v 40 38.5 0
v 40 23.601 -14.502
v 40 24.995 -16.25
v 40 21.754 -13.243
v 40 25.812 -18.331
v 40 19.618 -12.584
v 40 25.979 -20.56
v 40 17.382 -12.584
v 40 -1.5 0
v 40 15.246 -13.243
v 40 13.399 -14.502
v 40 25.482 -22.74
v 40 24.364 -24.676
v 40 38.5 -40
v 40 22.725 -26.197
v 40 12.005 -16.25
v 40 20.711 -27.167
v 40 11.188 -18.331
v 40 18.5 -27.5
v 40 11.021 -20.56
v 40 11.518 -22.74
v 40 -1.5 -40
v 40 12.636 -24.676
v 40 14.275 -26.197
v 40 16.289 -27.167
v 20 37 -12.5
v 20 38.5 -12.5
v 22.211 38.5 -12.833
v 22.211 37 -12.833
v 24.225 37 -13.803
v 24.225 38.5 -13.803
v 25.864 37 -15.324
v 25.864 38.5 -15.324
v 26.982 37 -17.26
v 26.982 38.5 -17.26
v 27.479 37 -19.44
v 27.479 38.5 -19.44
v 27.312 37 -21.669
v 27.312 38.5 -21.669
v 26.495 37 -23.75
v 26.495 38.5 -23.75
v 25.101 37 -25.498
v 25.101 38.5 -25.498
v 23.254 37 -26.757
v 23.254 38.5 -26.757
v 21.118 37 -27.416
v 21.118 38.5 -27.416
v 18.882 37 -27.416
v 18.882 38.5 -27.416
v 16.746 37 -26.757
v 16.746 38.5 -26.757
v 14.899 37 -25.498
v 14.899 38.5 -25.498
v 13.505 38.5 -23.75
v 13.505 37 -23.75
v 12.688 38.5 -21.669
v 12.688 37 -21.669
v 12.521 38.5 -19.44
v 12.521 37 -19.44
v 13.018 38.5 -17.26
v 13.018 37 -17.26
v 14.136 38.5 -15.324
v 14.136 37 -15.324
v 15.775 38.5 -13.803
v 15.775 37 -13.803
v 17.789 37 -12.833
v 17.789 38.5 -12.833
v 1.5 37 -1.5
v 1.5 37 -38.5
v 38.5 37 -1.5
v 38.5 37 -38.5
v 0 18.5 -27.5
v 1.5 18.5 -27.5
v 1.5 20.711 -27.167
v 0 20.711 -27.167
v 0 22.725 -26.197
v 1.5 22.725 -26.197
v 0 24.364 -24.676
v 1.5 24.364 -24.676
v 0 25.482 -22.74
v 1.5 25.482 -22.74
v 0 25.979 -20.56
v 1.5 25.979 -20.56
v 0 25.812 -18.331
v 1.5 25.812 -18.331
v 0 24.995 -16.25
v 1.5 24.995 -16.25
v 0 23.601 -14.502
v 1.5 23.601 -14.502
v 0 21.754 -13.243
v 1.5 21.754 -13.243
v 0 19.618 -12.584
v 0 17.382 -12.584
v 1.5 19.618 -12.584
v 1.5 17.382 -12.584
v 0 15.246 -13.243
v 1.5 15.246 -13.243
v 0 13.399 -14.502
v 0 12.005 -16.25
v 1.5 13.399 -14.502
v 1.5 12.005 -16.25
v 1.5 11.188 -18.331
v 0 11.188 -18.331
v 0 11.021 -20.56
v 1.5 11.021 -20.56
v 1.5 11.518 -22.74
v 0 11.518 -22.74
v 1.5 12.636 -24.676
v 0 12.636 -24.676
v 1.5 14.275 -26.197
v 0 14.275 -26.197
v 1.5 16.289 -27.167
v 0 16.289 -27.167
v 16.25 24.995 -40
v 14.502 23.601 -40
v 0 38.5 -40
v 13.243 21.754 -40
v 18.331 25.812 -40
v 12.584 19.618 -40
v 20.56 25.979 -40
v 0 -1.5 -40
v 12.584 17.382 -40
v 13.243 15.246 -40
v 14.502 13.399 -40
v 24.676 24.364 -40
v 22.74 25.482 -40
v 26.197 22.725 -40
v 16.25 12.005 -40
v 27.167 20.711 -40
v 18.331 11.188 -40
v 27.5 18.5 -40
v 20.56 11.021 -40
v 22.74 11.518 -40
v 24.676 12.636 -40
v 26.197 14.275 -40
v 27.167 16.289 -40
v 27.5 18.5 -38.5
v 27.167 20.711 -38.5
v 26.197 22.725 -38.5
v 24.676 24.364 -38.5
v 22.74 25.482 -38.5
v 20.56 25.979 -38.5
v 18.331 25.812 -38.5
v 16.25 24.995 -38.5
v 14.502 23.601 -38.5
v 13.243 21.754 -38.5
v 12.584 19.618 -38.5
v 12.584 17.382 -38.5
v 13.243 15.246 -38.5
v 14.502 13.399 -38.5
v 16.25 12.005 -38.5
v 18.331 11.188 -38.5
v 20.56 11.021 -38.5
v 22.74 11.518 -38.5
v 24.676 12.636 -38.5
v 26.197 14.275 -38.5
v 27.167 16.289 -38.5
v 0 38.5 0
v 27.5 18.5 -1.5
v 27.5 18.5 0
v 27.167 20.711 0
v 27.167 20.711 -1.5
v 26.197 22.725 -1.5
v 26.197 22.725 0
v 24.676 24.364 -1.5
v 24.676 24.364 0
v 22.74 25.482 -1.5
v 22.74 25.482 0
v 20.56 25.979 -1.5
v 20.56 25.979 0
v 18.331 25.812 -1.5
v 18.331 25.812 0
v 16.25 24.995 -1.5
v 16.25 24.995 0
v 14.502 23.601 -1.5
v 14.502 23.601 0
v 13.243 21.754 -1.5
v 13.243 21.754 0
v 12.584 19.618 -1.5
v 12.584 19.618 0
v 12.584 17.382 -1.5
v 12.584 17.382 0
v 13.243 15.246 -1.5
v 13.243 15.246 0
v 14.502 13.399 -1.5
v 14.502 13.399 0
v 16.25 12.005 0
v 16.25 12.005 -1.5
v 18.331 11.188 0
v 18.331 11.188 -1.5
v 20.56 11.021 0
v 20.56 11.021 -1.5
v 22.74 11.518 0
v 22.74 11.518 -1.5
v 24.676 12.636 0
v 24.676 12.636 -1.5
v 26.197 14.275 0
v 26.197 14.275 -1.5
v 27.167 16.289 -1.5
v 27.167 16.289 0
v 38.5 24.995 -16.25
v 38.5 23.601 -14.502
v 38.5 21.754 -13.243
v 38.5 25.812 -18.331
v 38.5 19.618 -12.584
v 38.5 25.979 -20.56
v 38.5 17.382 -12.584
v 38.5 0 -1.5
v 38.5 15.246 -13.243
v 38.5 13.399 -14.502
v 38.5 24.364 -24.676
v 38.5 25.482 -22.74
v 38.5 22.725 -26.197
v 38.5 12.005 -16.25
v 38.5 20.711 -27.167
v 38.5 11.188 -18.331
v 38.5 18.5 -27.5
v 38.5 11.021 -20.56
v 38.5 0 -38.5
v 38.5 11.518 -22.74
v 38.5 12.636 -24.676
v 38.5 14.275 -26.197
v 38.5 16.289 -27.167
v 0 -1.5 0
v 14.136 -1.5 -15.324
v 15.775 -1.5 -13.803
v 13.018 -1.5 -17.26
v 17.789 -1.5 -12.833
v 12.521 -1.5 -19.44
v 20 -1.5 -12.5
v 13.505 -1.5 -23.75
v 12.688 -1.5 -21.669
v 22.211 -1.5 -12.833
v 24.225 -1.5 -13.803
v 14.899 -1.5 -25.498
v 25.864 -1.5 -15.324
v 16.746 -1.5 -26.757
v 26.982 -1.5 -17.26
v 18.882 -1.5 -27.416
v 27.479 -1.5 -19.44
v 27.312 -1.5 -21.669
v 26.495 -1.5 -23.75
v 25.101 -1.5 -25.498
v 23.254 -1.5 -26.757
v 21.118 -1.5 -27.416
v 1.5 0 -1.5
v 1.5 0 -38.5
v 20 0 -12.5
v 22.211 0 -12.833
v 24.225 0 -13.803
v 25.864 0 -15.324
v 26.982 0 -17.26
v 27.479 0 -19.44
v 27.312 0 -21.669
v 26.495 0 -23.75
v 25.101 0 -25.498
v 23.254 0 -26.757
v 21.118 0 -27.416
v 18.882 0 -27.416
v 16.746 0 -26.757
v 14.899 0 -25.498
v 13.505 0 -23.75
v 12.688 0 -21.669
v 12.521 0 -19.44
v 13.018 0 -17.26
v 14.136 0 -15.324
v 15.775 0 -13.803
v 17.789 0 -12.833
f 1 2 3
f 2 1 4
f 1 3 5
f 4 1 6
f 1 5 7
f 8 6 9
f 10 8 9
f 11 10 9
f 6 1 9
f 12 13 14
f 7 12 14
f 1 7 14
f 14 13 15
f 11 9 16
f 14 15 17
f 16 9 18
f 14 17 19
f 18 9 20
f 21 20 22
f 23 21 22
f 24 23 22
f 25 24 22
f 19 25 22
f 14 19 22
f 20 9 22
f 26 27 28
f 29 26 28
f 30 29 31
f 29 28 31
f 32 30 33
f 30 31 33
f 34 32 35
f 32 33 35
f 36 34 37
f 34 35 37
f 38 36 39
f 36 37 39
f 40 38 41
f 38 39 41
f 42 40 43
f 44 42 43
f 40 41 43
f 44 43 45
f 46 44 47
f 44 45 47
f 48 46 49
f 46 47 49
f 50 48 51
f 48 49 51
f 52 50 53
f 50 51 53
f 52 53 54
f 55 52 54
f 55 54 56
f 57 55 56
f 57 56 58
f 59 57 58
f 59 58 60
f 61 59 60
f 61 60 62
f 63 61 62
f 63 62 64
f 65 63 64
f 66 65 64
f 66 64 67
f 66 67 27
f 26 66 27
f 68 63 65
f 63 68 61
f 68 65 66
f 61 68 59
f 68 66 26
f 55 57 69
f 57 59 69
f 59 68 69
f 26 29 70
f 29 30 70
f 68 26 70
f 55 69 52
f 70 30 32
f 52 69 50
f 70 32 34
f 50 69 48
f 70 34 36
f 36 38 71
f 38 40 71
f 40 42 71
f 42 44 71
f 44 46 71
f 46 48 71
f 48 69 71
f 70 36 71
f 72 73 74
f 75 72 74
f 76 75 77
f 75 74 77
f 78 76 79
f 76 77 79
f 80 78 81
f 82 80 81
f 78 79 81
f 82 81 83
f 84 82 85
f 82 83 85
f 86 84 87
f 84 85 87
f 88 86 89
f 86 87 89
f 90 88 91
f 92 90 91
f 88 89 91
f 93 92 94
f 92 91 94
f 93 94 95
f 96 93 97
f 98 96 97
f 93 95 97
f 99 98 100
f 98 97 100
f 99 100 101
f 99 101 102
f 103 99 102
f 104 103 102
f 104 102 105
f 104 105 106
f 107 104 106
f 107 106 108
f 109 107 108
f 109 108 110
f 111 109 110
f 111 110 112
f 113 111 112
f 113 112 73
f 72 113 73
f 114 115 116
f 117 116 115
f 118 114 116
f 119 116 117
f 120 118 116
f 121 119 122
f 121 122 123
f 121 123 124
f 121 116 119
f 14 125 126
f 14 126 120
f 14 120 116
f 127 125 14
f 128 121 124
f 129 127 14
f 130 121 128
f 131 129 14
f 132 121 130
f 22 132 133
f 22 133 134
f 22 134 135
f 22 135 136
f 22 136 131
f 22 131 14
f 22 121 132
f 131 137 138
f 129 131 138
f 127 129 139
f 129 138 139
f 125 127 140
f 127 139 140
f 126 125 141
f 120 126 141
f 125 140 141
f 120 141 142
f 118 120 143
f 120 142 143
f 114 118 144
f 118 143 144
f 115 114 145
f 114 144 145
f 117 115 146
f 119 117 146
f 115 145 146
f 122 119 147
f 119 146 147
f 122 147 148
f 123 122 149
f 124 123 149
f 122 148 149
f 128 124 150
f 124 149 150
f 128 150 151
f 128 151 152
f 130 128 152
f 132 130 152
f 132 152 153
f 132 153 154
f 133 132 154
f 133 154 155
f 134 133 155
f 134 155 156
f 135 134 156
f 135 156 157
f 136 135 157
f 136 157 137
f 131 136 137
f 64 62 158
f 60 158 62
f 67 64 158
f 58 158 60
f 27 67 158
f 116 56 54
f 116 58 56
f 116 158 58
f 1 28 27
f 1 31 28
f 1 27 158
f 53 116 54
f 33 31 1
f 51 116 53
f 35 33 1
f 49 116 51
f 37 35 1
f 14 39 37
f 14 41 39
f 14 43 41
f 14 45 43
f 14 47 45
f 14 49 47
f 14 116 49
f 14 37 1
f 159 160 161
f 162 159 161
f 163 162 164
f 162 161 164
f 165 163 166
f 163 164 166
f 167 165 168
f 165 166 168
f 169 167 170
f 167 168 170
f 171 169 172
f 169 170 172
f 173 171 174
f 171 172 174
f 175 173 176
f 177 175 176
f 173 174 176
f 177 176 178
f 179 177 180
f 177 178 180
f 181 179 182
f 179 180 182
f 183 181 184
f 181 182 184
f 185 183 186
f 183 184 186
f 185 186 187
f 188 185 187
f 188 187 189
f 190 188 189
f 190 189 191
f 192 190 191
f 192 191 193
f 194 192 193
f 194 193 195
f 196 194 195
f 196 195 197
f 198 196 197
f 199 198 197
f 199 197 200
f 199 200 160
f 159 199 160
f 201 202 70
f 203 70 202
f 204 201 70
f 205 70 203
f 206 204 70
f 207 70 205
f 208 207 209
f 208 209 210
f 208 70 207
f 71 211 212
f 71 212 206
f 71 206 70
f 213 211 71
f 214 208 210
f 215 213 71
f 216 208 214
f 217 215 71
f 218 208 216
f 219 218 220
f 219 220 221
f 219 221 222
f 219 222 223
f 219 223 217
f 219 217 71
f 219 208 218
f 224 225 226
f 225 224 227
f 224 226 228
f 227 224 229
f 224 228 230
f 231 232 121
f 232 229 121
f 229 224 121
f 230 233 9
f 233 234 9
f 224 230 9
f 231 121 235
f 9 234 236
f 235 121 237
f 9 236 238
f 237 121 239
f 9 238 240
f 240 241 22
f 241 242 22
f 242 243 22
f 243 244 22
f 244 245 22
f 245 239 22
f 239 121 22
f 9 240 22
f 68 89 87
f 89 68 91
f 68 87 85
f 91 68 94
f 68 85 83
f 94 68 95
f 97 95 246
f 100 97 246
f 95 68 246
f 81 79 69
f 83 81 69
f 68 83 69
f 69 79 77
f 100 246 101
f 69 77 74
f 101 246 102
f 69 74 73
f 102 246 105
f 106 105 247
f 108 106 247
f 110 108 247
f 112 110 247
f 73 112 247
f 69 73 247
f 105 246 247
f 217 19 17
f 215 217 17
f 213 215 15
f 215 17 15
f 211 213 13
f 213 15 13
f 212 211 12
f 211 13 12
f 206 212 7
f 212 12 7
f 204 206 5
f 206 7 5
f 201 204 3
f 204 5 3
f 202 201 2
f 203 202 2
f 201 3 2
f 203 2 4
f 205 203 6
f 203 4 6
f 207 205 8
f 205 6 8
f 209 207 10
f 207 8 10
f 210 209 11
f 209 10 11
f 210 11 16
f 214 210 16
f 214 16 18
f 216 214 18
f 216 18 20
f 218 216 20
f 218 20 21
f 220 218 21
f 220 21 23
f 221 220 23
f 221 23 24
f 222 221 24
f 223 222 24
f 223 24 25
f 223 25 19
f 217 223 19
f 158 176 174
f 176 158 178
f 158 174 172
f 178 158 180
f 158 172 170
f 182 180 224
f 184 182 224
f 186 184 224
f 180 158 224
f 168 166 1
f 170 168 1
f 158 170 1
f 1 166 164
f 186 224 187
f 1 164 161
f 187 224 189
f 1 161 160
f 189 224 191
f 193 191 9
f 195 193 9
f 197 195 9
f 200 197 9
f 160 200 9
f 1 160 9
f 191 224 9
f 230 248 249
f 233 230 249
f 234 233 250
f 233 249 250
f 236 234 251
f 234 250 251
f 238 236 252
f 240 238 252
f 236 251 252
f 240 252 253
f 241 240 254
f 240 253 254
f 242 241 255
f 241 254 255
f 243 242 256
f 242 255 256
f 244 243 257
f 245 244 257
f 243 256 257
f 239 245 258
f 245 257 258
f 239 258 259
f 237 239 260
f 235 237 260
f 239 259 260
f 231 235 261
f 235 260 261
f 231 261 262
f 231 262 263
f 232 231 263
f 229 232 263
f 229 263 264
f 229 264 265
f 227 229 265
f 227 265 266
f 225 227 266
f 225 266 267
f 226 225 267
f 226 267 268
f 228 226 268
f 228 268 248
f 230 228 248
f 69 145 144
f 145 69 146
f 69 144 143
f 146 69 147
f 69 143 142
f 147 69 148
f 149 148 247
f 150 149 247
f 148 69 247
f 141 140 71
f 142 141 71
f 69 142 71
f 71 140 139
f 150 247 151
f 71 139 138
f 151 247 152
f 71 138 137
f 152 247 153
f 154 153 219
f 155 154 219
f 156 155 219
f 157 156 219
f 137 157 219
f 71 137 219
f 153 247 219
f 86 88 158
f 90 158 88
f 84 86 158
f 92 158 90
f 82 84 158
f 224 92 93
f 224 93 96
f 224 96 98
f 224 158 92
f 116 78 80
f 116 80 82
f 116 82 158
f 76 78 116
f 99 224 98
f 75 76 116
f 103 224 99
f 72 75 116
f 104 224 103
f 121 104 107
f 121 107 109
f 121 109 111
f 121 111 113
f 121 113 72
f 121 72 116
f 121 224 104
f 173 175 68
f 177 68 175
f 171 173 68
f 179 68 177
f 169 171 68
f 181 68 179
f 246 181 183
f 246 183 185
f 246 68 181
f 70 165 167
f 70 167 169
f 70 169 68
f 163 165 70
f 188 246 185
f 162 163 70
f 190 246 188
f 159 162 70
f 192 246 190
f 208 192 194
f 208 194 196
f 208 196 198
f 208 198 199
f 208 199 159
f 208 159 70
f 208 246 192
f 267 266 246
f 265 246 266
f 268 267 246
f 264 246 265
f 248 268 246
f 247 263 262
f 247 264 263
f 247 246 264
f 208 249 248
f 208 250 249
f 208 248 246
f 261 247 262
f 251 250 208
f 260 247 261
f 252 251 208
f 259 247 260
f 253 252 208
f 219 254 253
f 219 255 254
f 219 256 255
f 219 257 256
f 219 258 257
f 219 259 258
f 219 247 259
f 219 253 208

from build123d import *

# Parameters (mm, degrees)
SKETCH1_W           = 40
SKETCH1_H           = 40
BOSS_EXTRUDE2_DEPTH = 1.5
SKETCH2_W           = 40
SKETCH2_H           = 40
SKETCH2_W_2         = 37
SKETCH2_H_2         = 37
BOSS_EXTRUDE3_DEPTH = 37
SKETCH3_W           = 40
SKETCH3_H           = 40
BOSS_EXTRUDE4_DEPTH = 1.5
SKETCH4_R           = 7.5
CUT_EXTRUDE1_DEPTH  = 70.282032303
SKETCH5_R           = 7.5
CUT_EXTRUDE2_DEPTH  = 69.426968368
SKETCH6_R           = 7.5
CUT_EXTRUDE3_DEPTH  = 69.426968368


with BuildPart() as part:
    # Sketch1 → Boss-Extrude2 (new body)
    with BuildSketch(Plane(origin=(0, 0, 0), x_dir=(1, 0, 0), z_dir=(0, 1, 0))):
        with Locations((20, 20)):
            Rectangle(SKETCH1_W, SKETCH1_H)
    extrude(amount=-BOSS_EXTRUDE2_DEPTH)

    # Sketch2 → Boss-Extrude3 (add)
    with BuildSketch(Plane(origin=(0, 0, 0), x_dir=(1, 0, 0), z_dir=(0, 1, 0))):
        with Locations((20, 20)):
            Rectangle(SKETCH2_W, SKETCH2_H)
        with Locations((20, 20)):
            Rectangle(SKETCH2_W_2, SKETCH2_H_2, mode=Mode.SUBTRACT)
    extrude(amount=BOSS_EXTRUDE3_DEPTH)

    # Sketch3 → Boss-Extrude4 (add)
    with BuildSketch(Plane(origin=(0, 37, 0), x_dir=(1, 0, 0), z_dir=(0, 1, 0))):
        with Locations((20, 20)):
            Rectangle(SKETCH3_W, SKETCH3_H)
    extrude(amount=BOSS_EXTRUDE4_DEPTH)

    # Sketch4 → Cut-Extrude1 (cut, through all)
    with BuildSketch(Plane(origin=(0, 38.5, 0), x_dir=(1, 0, 0), z_dir=(0, 1, 0))):
        with Locations(Location((20, 20, 0), (0, 0, 270))):
            Circle(SKETCH4_R)
    extrude(amount=-CUT_EXTRUDE1_DEPTH, mode=Mode.SUBTRACT)

    # Sketch5 → Cut-Extrude2 (cut, through all)
    with BuildSketch(Plane(origin=(40, 0, 0), x_dir=(0, 0, -1), z_dir=(1, 0, 0))):
        with Locations((20, 18.5)):
            Circle(SKETCH5_R)
    extrude(amount=-CUT_EXTRUDE2_DEPTH, mode=Mode.SUBTRACT)

    # Sketch6 → Cut-Extrude3 (cut, through all)
    with BuildSketch(Plane.XY):
        with Locations((20, 18.5)):
            Circle(SKETCH6_R)
    extrude(amount=-CUT_EXTRUDE3_DEPTH, mode=Mode.SUBTRACT)


solid = part.part
